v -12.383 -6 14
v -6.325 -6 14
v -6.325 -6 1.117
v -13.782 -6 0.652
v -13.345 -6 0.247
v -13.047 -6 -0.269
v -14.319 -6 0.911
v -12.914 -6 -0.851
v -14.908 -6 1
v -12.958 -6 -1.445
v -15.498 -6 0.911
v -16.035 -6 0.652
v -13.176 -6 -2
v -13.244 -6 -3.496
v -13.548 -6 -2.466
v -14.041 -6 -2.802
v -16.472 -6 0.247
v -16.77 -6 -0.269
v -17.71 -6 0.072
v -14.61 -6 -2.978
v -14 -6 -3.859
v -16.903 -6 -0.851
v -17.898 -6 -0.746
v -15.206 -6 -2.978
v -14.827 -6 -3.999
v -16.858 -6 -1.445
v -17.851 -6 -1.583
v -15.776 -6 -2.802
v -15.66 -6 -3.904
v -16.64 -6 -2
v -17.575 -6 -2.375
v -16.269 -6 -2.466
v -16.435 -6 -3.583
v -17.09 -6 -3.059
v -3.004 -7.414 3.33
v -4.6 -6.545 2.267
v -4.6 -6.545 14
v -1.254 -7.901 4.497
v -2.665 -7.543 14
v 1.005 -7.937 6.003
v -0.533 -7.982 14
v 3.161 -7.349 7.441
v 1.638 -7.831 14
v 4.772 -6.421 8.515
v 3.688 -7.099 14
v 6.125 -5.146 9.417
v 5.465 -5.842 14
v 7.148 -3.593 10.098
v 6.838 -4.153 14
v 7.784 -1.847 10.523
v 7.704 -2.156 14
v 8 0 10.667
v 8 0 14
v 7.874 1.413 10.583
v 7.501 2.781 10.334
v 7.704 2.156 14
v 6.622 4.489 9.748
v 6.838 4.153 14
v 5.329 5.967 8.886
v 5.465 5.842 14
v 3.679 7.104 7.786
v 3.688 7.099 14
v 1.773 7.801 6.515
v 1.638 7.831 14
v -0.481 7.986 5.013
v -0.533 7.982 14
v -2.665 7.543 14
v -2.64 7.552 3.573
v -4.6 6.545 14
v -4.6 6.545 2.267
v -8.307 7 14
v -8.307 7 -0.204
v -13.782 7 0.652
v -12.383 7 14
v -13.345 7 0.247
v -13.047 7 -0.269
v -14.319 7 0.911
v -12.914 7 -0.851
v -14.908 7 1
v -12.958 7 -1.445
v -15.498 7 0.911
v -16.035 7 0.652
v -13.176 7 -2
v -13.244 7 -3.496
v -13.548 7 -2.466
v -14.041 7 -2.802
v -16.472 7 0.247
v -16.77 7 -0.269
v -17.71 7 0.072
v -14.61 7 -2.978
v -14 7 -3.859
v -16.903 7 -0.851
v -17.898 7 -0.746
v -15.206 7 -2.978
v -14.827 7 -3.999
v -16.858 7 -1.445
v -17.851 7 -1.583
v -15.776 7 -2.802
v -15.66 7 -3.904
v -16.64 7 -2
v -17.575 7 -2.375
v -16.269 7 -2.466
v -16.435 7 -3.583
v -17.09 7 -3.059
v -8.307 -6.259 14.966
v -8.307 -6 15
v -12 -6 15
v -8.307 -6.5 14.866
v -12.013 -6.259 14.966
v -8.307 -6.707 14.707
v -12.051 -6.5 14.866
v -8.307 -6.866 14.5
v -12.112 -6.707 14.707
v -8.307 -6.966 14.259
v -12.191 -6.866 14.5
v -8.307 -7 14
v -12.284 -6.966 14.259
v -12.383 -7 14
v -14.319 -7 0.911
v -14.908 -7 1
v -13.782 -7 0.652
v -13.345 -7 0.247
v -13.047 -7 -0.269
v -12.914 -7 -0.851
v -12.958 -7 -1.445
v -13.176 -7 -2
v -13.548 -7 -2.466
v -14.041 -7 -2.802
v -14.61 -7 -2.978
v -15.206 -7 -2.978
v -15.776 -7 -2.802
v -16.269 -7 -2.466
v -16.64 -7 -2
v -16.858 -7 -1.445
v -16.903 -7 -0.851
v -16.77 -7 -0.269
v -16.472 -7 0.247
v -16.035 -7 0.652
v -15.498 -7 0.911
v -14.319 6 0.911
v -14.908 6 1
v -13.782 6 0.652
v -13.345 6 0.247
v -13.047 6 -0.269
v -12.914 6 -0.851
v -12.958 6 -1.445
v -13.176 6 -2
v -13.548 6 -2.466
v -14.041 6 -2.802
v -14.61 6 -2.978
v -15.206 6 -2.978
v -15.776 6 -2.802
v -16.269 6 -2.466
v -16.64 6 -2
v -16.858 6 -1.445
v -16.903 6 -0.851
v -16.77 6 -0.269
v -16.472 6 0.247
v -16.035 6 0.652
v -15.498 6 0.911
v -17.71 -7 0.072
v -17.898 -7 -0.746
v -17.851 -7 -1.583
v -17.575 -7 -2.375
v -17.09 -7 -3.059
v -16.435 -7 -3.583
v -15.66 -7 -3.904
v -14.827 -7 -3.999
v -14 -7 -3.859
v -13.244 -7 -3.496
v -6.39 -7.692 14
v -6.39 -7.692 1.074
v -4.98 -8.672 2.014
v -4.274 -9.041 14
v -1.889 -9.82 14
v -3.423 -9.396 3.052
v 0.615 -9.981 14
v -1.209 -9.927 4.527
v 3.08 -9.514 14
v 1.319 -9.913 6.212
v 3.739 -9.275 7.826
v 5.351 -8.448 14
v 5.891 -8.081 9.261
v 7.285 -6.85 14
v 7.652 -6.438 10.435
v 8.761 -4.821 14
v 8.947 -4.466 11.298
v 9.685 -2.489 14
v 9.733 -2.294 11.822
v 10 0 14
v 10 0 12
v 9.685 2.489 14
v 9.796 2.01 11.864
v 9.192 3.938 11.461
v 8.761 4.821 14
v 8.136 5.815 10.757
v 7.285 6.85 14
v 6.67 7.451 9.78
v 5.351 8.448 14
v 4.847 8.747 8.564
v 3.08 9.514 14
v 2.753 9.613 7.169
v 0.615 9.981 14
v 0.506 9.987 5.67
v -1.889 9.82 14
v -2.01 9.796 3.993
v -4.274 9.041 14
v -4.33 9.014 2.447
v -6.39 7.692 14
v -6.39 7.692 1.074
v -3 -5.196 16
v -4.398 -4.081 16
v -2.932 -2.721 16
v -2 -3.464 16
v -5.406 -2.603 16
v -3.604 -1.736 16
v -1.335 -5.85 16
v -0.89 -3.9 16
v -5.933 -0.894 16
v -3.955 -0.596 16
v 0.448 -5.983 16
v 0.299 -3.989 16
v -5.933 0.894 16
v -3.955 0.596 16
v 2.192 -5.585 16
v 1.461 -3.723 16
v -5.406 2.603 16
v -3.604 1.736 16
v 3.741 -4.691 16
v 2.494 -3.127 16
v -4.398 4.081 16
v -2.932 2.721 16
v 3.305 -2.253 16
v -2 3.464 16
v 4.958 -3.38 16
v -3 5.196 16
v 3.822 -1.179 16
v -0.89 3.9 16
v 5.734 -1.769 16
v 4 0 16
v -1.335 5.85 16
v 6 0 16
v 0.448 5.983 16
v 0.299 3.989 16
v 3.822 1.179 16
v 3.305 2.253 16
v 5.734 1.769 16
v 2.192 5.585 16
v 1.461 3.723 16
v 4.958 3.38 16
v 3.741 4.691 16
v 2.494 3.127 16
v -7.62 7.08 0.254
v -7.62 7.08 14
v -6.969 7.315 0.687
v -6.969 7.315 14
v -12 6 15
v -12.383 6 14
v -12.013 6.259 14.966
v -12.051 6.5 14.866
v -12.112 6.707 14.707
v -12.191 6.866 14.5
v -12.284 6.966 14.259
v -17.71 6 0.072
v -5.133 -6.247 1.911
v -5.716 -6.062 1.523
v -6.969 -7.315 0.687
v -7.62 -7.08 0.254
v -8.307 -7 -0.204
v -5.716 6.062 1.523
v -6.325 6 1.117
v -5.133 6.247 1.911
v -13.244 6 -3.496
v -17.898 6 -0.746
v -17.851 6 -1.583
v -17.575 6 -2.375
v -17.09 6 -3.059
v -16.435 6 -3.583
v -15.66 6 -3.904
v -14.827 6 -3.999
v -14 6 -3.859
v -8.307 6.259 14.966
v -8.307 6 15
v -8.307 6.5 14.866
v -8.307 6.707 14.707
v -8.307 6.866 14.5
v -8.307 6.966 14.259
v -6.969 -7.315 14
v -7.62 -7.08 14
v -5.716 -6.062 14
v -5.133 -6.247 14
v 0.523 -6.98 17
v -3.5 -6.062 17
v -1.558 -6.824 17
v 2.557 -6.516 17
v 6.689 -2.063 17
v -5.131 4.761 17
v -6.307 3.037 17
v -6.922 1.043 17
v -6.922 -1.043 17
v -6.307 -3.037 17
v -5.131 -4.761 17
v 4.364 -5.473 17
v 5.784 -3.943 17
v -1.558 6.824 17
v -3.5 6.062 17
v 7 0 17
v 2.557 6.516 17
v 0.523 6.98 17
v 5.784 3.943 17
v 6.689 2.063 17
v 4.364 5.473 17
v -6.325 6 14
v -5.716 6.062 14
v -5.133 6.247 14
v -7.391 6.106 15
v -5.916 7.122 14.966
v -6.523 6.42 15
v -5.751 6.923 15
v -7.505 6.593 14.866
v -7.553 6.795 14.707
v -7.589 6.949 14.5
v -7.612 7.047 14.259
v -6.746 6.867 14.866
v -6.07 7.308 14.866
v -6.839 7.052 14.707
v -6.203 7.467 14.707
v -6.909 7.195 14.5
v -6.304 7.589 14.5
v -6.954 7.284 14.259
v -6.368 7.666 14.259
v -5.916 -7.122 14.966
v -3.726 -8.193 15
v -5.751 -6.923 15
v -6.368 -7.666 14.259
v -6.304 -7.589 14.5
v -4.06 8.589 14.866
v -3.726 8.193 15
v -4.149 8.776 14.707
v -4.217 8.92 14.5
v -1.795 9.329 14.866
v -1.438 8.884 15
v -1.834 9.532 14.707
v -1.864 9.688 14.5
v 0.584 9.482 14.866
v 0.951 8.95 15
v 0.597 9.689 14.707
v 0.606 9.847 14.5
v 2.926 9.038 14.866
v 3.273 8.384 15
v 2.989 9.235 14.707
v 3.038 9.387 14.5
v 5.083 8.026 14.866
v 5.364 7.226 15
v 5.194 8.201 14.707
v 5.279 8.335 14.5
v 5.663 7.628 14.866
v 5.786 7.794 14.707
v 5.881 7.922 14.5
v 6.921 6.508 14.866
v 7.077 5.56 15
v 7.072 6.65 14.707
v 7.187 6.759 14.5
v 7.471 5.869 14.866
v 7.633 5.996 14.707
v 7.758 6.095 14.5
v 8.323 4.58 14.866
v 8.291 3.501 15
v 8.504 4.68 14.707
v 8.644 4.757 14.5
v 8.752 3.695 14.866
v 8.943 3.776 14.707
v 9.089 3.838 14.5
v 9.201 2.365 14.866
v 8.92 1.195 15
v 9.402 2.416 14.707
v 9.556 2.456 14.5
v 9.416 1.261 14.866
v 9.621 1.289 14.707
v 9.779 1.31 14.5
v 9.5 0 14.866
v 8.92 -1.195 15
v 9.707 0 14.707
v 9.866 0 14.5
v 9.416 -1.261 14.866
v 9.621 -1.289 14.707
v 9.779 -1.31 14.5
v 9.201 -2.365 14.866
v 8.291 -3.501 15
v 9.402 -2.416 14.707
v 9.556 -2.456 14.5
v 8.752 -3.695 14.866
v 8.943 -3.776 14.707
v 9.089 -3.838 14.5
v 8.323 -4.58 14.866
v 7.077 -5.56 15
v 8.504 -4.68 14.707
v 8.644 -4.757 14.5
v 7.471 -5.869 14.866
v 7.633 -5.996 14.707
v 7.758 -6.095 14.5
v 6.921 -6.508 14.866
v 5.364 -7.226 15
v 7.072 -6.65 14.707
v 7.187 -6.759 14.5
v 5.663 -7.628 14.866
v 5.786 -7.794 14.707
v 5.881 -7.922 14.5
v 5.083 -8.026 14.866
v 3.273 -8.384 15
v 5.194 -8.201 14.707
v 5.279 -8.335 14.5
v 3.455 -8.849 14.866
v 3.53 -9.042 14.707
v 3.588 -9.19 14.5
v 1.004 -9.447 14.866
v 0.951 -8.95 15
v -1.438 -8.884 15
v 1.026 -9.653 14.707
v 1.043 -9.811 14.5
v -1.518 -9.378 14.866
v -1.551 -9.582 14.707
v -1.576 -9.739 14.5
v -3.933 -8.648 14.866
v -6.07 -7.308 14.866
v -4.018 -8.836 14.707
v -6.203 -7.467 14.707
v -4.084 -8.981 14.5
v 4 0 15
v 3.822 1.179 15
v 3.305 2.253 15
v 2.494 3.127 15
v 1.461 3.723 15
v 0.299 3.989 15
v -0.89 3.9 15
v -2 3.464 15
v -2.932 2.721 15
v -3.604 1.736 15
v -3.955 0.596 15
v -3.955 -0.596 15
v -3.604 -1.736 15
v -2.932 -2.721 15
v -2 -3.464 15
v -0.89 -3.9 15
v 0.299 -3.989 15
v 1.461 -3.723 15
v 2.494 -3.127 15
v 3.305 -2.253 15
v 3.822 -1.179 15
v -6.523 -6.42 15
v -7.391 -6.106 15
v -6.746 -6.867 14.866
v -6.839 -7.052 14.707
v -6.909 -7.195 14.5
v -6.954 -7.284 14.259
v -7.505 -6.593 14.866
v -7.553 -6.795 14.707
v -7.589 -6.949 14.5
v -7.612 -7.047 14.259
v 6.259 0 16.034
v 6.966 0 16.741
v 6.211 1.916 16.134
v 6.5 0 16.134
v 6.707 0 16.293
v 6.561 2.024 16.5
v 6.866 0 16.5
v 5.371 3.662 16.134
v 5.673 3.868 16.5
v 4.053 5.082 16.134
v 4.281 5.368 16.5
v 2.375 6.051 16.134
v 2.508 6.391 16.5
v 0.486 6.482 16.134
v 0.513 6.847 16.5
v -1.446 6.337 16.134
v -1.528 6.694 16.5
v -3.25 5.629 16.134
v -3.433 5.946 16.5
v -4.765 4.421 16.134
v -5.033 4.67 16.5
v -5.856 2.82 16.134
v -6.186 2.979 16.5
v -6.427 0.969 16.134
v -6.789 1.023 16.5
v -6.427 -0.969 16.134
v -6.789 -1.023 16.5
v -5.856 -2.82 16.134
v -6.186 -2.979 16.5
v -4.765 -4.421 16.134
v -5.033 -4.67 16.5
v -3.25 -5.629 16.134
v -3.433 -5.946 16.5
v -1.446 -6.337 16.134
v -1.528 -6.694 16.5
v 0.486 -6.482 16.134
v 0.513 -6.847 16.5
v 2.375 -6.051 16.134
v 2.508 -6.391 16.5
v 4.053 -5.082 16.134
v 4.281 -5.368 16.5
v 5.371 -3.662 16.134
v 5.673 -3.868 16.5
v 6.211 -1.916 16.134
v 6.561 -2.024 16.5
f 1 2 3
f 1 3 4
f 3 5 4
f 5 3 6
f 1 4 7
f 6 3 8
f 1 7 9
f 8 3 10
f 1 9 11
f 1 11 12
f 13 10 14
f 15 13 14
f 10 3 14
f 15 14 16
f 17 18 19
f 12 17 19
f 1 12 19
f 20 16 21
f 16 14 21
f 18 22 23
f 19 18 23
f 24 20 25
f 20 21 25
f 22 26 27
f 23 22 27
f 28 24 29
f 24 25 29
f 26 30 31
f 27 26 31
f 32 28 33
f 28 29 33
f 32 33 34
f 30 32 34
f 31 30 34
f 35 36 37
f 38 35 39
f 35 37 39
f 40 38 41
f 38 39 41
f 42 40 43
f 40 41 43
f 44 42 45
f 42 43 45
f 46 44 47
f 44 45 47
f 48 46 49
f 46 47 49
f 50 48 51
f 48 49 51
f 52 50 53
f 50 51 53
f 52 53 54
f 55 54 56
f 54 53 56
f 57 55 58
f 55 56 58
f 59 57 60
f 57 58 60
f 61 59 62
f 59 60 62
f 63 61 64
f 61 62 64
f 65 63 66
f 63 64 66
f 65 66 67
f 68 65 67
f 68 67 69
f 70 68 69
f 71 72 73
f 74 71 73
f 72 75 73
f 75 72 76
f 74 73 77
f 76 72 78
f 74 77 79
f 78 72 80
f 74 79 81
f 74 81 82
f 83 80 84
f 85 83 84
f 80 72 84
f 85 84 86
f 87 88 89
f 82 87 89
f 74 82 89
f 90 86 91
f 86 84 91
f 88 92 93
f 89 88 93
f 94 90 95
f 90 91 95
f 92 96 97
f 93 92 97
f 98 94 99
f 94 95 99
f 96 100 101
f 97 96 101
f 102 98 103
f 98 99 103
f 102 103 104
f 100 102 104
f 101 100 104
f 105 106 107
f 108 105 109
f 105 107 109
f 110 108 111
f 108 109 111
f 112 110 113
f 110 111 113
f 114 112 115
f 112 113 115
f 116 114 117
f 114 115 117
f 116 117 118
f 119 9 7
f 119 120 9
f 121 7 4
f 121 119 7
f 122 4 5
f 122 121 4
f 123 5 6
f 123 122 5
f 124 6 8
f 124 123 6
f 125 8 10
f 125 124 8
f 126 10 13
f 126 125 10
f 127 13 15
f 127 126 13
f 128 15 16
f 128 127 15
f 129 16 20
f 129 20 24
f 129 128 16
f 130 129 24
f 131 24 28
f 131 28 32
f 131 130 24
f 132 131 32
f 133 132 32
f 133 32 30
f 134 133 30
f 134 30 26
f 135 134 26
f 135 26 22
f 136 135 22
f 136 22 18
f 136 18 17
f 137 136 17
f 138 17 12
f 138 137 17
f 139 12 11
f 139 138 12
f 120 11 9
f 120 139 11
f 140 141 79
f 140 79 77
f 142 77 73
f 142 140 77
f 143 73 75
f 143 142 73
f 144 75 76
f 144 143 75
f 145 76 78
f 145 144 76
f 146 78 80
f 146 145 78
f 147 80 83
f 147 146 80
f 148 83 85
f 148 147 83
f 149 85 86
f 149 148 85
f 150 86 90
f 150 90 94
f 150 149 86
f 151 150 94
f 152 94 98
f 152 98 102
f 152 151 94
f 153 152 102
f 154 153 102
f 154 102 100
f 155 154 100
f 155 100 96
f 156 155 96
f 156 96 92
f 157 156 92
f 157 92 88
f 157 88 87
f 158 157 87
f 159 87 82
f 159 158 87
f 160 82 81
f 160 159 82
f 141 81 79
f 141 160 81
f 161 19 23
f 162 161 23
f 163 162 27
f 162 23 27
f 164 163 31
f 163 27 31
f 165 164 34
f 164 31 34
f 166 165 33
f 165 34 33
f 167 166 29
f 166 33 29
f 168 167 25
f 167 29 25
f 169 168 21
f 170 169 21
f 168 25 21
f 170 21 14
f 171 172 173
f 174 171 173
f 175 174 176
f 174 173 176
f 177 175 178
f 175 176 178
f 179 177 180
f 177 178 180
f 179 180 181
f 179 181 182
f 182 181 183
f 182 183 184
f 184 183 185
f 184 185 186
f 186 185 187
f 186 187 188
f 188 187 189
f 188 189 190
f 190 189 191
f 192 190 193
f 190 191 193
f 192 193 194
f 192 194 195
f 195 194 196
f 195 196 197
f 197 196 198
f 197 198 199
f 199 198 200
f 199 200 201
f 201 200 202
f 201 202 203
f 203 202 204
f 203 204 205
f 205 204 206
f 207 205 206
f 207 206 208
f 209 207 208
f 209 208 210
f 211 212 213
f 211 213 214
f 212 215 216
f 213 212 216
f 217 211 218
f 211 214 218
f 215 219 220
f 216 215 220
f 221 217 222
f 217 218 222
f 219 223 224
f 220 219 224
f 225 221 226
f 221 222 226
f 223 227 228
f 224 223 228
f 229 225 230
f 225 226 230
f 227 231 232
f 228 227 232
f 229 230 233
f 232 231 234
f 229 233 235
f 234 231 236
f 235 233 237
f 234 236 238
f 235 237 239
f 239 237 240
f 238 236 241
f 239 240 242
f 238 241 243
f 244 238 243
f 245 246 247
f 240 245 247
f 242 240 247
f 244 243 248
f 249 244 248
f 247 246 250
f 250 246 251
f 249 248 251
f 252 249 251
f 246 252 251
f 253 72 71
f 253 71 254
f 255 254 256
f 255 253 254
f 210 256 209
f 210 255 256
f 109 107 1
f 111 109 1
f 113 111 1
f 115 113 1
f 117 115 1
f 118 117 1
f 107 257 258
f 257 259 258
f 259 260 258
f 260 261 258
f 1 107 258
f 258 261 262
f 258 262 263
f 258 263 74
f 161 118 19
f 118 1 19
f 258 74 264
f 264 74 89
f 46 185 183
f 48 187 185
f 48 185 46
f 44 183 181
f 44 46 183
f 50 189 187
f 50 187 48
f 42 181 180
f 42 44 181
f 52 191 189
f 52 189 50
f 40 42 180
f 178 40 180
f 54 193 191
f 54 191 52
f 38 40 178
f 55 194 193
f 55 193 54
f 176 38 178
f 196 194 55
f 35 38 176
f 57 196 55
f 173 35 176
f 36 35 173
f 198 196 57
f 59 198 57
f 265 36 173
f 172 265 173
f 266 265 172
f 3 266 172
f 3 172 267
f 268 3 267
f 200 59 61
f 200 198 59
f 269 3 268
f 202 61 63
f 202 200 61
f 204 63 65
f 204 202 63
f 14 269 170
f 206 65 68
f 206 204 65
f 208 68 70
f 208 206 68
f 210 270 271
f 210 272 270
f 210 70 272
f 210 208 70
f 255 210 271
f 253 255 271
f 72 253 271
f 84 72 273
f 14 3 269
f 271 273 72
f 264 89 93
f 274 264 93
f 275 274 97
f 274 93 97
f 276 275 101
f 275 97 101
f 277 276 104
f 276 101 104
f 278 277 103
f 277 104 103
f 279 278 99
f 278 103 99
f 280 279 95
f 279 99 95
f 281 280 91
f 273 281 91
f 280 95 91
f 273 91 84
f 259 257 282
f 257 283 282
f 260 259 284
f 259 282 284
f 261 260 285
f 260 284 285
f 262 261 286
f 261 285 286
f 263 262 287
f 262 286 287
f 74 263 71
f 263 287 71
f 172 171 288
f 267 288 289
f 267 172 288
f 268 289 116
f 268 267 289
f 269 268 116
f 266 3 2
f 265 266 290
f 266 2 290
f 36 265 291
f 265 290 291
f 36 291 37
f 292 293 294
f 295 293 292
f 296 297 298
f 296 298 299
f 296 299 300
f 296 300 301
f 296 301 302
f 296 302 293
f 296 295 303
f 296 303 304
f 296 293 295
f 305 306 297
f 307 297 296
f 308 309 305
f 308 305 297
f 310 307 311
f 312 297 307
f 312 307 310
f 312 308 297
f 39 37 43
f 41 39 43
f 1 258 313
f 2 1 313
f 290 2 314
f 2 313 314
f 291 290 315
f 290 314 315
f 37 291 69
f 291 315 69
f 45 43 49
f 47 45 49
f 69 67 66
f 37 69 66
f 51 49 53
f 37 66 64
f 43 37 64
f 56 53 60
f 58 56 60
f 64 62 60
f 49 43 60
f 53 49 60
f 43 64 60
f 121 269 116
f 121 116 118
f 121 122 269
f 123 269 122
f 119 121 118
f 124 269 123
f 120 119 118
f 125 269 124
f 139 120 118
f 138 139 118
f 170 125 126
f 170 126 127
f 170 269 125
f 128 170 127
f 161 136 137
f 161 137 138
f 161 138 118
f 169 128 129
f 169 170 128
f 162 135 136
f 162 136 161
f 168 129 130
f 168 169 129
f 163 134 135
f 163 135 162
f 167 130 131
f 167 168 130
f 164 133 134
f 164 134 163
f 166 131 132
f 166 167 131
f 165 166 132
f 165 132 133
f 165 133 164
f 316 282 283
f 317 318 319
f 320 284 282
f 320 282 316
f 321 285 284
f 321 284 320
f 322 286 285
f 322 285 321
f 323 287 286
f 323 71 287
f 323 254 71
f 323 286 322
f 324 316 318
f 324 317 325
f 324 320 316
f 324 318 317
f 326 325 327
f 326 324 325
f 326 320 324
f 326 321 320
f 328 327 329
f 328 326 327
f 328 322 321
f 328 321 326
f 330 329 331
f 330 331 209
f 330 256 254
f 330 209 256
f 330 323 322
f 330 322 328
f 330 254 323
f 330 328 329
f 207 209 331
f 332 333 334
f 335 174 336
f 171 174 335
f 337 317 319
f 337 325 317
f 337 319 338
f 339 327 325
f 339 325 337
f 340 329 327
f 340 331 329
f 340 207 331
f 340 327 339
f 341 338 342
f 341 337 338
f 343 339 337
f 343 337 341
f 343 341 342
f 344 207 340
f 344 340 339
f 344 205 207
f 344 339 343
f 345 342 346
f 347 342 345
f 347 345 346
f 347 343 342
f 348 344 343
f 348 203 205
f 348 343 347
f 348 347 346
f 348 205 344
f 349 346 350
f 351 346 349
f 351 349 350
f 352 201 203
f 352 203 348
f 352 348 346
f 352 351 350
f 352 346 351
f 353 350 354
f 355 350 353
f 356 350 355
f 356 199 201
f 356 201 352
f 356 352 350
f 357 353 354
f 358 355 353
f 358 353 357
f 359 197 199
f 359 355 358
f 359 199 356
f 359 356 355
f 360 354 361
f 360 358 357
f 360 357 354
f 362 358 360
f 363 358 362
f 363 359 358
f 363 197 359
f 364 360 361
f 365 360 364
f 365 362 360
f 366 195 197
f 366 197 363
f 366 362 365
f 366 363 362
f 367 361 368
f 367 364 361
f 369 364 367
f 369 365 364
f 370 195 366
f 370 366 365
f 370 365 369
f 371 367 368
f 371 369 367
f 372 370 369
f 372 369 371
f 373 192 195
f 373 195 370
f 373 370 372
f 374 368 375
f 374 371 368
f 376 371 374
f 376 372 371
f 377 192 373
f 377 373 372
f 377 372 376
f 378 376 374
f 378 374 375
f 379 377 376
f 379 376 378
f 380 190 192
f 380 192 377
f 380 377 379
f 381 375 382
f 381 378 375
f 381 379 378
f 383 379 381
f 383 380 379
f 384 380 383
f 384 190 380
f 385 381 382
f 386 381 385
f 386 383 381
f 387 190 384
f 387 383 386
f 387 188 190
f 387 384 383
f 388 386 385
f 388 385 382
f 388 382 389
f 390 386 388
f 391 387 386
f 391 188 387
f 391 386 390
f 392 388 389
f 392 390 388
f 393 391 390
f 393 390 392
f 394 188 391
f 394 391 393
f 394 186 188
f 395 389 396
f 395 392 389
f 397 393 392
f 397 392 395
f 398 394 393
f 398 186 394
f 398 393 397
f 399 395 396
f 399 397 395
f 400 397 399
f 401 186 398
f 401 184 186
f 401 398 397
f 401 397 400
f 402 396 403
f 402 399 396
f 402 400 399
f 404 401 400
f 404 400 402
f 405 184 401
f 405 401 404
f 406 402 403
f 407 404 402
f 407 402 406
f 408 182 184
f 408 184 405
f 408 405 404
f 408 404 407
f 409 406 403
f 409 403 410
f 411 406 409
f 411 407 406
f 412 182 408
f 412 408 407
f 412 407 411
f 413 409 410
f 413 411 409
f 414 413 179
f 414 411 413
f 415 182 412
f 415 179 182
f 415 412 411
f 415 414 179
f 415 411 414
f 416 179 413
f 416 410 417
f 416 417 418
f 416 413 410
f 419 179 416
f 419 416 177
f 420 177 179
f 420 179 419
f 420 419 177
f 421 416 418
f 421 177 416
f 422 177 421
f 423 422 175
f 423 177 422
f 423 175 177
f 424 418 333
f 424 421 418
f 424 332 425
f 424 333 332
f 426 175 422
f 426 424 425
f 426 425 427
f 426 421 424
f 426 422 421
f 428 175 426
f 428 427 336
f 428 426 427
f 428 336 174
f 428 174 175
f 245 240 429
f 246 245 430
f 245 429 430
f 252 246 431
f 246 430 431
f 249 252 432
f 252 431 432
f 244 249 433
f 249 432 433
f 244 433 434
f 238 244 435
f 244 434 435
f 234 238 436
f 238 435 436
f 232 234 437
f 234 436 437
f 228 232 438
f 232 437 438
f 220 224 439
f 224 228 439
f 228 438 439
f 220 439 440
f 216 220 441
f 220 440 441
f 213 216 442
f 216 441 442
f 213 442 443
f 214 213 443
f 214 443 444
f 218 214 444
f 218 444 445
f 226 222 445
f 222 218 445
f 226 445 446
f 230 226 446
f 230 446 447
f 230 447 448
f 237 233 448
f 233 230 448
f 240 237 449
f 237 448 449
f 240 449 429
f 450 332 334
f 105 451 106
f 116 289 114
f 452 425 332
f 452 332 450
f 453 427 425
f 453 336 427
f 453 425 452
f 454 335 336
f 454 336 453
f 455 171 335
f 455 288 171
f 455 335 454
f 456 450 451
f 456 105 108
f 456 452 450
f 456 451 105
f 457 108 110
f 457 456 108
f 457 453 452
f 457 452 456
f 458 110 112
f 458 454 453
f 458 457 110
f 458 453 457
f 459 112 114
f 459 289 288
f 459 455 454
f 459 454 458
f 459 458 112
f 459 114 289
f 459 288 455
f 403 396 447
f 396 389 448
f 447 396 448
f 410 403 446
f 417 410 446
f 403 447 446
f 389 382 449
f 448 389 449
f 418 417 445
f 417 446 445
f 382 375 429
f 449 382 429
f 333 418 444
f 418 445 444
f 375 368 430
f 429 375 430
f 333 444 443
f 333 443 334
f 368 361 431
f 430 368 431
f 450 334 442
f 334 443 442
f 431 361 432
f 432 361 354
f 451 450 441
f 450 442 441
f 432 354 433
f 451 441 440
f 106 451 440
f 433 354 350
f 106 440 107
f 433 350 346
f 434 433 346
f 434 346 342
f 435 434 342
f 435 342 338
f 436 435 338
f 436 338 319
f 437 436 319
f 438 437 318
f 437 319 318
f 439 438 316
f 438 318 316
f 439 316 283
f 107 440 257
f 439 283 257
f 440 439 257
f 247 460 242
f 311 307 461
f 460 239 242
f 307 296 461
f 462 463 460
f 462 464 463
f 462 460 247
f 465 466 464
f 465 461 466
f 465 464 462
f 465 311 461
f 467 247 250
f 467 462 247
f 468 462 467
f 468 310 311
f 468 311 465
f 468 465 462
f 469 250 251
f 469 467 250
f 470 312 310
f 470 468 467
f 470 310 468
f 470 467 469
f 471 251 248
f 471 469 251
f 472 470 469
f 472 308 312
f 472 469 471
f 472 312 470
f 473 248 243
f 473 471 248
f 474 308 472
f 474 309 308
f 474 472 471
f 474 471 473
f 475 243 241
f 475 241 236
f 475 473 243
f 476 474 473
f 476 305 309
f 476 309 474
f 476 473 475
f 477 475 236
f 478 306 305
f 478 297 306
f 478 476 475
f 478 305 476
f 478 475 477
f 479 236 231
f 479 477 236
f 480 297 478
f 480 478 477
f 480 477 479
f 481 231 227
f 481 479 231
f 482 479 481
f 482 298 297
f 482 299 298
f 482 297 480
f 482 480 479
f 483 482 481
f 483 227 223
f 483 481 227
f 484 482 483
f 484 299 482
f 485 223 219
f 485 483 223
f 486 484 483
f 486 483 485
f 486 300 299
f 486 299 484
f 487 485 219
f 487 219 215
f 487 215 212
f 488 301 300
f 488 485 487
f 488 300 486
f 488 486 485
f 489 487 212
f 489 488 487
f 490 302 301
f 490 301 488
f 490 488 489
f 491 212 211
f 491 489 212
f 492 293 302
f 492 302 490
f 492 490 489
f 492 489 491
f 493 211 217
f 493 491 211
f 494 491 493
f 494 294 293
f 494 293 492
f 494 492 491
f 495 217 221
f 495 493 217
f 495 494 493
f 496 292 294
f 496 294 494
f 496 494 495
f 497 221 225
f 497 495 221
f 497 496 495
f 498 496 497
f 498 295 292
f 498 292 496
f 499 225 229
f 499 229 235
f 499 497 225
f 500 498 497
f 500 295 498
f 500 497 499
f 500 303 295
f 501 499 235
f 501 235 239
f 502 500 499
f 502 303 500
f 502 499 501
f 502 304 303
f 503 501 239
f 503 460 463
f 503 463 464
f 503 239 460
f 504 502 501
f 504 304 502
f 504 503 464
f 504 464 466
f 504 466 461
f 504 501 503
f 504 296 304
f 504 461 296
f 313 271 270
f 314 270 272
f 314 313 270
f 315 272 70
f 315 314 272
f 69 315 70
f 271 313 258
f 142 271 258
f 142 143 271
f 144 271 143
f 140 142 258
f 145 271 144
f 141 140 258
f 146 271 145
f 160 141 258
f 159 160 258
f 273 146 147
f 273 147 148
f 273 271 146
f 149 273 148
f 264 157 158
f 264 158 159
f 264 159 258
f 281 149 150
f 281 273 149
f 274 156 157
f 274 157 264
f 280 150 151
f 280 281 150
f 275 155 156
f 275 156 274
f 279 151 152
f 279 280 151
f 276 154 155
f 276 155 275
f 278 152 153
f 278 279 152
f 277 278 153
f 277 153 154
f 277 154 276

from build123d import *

# Parameters (mm, degrees)
SKETCH_1_R          = 10
EXTRUDE_1_DEPTH     = 14
CUT_EXTRUDE_1_DEPTH = 500
SKETCH_4_R          = 8
CUT_EXTRUDE_2_DEPTH = 1000
SKETCH_6_R          = 10
EXTRUDE_2_DEPTH     = 1
SKETCH_5_R          = 2.000000000000003
EXTRUDE_3_DEPTH     = 7
SKETCH_5_2_R        = 2.000000000000003
CUT_EXTRUDE_3_DEPTH = 6
SKETCH_7_W          = 0.9999999999999662
SKETCH_7_H          = 12
EXTRUDE_4_DEPTH     = 5
EXTRUDE_5_DEPTH     = 12
SKETCH_9_W          = 12.6666666666667
SKETCH_9_H          = 12
CUT_EXTRUDE_4_DEPTH = 5
SKETCH_10_R         = 4
EXTRUDE_6_DEPTH     = 2
SKETCH_11_R         = 7
EXTRUDE_7_DEPTH     = 1
FILLET_1_R          = 3
FILLET_2_R          = 1
FILLET_4_R          = 1


with BuildPart() as part:
    # 草图1 → 凸台-拉伸1 (new body)
    with BuildSketch(Plane.XY):
        Circle(SKETCH_1_R)
    extrude(amount=EXTRUDE_1_DEPTH)

    # 草图3 → 切除-拉伸1 (cut, symmetric)
    with BuildSketch(Plane(origin=(0, 0, 0), x_dir=(1, 0, 0), z_dir=(0, 1, 0))):
        Polygon((-7.999999999999998, 0), (10, 0), (10, -12), align=None)
    extrude(amount=CUT_EXTRUDE_1_DEPTH, both=True, mode=Mode.SUBTRACT)

    # 草图4 → 切除-拉伸2 (cut)
    with BuildSketch(Plane.XY.offset(14)):
        Circle(SKETCH_4_R)
    extrude(amount=-CUT_EXTRUDE_2_DEPTH, mode=Mode.SUBTRACT)

    # 草图6 → 凸台-拉伸2 (add)
    with BuildSketch(Plane.XY.offset(14)):
        Circle(SKETCH_6_R)
    extrude(amount=EXTRUDE_2_DEPTH)

    # 草图5 → 凸台-拉伸3 (add, symmetric)
    with BuildSketch(Plane(origin=(0, 0, 0), x_dir=(1, 0, 0), z_dir=(0, 1, 0))):
        with BuildLine():
            Line((-5.9999999999999964, -14.999999999999968), (-11.999999999999996, -14.999999999999968))
            Line((-11.999999999999996, -14.999999999999968), (-17.71032629227648, -0.0718206378086078))
            ThreePointArc((-17.71032629227648, -0.0718206378086078), (-16.78084089382489, 3.3438624943348247), (-13.244226324520296, 3.496150883013566))
            Line((-13.244226324520296, 3.496150883013566), (-5.999999999999997, -1.333333333333298))
            Line((-5.999999999999997, -1.333333333333298), (-5.9999999999999964, -14.999999999999968))
        make_face()
        with Locations(Location((-14.908326913195987, 1.0000000000000329, 0), (0, 0, 270))):
            Circle(SKETCH_5_R, mode=Mode.SUBTRACT)
    extrude(amount=EXTRUDE_3_DEPTH, both=True)

    # 草图5<2> → 切除-拉伸3 (cut, symmetric)
    with BuildSketch(Plane(origin=(0, 0, 0), x_dir=(1, 0, 0), z_dir=(0, 1, 0))):
        with BuildLine():
            Line((-5.9999999999999964, -14.999999999999968), (-11.999999999999996, -14.999999999999968))
            Line((-11.999999999999996, -14.999999999999968), (-17.71032629227648, -0.0718206378086078))
            ThreePointArc((-17.71032629227648, -0.0718206378086078), (-16.78084089382489, 3.3438624943348247), (-13.244226324520296, 3.496150883013566))
            Line((-13.244226324520296, 3.496150883013566), (-5.999999999999997, -1.333333333333298))
            Line((-5.999999999999997, -1.333333333333298), (-5.9999999999999964, -14.999999999999968))
        make_face()
        with Locations(Location((-14.908326913195987, 1.0000000000000329, 0), (0, 0, 270))):
            Circle(SKETCH_5_2_R, mode=Mode.SUBTRACT)
    extrude(amount=CUT_EXTRUDE_3_DEPTH, both=True, mode=Mode.SUBTRACT)

    # 草图7 → 凸台-拉伸4 (add)
    with BuildSketch(Plane.ZY.offset(5.999999999999997)):
        with Locations((14.499999999999986, 0)):
            Rectangle(SKETCH_7_W, SKETCH_7_H)
    extrude(amount=EXTRUDE_4_DEPTH)

    # 草图8 → 凸台-拉伸5 (add)
    with BuildSketch(Plane.XZ.offset(-6)):
        Polygon((-11.999999999999996, 14.999999999999968), (-12.382519941228653, 14), (-10.999999999999996, 14), (-10.999999999999996, 14.999999999999968), align=None)
    extrude(amount=EXTRUDE_5_DEPTH)

    # 草图9 → 切除-拉伸4 (cut)
    with BuildSketch(Plane.ZY.offset(5.999999999999997)):
        with Locations((7.6666666666666465, 0)):
            Rectangle(SKETCH_9_W, SKETCH_9_H)
    extrude(amount=-CUT_EXTRUDE_4_DEPTH, mode=Mode.SUBTRACT)

    # 草图10 → 凸台-拉伸6 (add)
    with BuildSketch(Plane.XY.offset(15)):
        Circle(SKETCH_10_R)
    extrude(amount=EXTRUDE_6_DEPTH)

    # 草图11 → 凸台-拉伸7 (add)
    with BuildSketch(Plane.XY.offset(17)):
        Circle(SKETCH_11_R)
    extrude(amount=-EXTRUDE_7_DEPTH)

    # 圆角1
    fillet_1_edges = [part.edges().sort_by_distance(p)[0] for p in [
        (-5.291502622129181, -6, 7.902832459290273),
        (-5.291502622129181, 6, 7.902832459290272),
        (-7.14142842854285, -7, 7.7861905238190845),
        (-7.14142842854285, 7, 7.786190523819085),
    ]]
    fillet(fillet_1_edges, radius=FILLET_1_R)

    # 圆角2
    fillet_2_edges = [part.edges().sort_by_distance(p)[0] for p in [
        (-7, 8.6e-16, 16),
    ]]
    fillet(fillet_2_edges, radius=FILLET_2_R - 0.0001)  # a hair under: the kernel refuses the full size

    # 圆角4
    fillet_4_edges = [part.edges().sort_by_distance(p)[0] for p in [
        (10, -1.78e-15, 15),
        (-7.287574532187941, -7.178380170622118, 14.999999999999968),
        (-7.287574532187943, 7.178380170622118, 14.999999999999968),
        (-10.153311931459037, 7, 14.999999999999968),
        (-10.153311931459037, -7, 14.999999999999968),
    ]]
    fillet(fillet_4_edges, radius=FILLET_4_R)


solid = part.part
